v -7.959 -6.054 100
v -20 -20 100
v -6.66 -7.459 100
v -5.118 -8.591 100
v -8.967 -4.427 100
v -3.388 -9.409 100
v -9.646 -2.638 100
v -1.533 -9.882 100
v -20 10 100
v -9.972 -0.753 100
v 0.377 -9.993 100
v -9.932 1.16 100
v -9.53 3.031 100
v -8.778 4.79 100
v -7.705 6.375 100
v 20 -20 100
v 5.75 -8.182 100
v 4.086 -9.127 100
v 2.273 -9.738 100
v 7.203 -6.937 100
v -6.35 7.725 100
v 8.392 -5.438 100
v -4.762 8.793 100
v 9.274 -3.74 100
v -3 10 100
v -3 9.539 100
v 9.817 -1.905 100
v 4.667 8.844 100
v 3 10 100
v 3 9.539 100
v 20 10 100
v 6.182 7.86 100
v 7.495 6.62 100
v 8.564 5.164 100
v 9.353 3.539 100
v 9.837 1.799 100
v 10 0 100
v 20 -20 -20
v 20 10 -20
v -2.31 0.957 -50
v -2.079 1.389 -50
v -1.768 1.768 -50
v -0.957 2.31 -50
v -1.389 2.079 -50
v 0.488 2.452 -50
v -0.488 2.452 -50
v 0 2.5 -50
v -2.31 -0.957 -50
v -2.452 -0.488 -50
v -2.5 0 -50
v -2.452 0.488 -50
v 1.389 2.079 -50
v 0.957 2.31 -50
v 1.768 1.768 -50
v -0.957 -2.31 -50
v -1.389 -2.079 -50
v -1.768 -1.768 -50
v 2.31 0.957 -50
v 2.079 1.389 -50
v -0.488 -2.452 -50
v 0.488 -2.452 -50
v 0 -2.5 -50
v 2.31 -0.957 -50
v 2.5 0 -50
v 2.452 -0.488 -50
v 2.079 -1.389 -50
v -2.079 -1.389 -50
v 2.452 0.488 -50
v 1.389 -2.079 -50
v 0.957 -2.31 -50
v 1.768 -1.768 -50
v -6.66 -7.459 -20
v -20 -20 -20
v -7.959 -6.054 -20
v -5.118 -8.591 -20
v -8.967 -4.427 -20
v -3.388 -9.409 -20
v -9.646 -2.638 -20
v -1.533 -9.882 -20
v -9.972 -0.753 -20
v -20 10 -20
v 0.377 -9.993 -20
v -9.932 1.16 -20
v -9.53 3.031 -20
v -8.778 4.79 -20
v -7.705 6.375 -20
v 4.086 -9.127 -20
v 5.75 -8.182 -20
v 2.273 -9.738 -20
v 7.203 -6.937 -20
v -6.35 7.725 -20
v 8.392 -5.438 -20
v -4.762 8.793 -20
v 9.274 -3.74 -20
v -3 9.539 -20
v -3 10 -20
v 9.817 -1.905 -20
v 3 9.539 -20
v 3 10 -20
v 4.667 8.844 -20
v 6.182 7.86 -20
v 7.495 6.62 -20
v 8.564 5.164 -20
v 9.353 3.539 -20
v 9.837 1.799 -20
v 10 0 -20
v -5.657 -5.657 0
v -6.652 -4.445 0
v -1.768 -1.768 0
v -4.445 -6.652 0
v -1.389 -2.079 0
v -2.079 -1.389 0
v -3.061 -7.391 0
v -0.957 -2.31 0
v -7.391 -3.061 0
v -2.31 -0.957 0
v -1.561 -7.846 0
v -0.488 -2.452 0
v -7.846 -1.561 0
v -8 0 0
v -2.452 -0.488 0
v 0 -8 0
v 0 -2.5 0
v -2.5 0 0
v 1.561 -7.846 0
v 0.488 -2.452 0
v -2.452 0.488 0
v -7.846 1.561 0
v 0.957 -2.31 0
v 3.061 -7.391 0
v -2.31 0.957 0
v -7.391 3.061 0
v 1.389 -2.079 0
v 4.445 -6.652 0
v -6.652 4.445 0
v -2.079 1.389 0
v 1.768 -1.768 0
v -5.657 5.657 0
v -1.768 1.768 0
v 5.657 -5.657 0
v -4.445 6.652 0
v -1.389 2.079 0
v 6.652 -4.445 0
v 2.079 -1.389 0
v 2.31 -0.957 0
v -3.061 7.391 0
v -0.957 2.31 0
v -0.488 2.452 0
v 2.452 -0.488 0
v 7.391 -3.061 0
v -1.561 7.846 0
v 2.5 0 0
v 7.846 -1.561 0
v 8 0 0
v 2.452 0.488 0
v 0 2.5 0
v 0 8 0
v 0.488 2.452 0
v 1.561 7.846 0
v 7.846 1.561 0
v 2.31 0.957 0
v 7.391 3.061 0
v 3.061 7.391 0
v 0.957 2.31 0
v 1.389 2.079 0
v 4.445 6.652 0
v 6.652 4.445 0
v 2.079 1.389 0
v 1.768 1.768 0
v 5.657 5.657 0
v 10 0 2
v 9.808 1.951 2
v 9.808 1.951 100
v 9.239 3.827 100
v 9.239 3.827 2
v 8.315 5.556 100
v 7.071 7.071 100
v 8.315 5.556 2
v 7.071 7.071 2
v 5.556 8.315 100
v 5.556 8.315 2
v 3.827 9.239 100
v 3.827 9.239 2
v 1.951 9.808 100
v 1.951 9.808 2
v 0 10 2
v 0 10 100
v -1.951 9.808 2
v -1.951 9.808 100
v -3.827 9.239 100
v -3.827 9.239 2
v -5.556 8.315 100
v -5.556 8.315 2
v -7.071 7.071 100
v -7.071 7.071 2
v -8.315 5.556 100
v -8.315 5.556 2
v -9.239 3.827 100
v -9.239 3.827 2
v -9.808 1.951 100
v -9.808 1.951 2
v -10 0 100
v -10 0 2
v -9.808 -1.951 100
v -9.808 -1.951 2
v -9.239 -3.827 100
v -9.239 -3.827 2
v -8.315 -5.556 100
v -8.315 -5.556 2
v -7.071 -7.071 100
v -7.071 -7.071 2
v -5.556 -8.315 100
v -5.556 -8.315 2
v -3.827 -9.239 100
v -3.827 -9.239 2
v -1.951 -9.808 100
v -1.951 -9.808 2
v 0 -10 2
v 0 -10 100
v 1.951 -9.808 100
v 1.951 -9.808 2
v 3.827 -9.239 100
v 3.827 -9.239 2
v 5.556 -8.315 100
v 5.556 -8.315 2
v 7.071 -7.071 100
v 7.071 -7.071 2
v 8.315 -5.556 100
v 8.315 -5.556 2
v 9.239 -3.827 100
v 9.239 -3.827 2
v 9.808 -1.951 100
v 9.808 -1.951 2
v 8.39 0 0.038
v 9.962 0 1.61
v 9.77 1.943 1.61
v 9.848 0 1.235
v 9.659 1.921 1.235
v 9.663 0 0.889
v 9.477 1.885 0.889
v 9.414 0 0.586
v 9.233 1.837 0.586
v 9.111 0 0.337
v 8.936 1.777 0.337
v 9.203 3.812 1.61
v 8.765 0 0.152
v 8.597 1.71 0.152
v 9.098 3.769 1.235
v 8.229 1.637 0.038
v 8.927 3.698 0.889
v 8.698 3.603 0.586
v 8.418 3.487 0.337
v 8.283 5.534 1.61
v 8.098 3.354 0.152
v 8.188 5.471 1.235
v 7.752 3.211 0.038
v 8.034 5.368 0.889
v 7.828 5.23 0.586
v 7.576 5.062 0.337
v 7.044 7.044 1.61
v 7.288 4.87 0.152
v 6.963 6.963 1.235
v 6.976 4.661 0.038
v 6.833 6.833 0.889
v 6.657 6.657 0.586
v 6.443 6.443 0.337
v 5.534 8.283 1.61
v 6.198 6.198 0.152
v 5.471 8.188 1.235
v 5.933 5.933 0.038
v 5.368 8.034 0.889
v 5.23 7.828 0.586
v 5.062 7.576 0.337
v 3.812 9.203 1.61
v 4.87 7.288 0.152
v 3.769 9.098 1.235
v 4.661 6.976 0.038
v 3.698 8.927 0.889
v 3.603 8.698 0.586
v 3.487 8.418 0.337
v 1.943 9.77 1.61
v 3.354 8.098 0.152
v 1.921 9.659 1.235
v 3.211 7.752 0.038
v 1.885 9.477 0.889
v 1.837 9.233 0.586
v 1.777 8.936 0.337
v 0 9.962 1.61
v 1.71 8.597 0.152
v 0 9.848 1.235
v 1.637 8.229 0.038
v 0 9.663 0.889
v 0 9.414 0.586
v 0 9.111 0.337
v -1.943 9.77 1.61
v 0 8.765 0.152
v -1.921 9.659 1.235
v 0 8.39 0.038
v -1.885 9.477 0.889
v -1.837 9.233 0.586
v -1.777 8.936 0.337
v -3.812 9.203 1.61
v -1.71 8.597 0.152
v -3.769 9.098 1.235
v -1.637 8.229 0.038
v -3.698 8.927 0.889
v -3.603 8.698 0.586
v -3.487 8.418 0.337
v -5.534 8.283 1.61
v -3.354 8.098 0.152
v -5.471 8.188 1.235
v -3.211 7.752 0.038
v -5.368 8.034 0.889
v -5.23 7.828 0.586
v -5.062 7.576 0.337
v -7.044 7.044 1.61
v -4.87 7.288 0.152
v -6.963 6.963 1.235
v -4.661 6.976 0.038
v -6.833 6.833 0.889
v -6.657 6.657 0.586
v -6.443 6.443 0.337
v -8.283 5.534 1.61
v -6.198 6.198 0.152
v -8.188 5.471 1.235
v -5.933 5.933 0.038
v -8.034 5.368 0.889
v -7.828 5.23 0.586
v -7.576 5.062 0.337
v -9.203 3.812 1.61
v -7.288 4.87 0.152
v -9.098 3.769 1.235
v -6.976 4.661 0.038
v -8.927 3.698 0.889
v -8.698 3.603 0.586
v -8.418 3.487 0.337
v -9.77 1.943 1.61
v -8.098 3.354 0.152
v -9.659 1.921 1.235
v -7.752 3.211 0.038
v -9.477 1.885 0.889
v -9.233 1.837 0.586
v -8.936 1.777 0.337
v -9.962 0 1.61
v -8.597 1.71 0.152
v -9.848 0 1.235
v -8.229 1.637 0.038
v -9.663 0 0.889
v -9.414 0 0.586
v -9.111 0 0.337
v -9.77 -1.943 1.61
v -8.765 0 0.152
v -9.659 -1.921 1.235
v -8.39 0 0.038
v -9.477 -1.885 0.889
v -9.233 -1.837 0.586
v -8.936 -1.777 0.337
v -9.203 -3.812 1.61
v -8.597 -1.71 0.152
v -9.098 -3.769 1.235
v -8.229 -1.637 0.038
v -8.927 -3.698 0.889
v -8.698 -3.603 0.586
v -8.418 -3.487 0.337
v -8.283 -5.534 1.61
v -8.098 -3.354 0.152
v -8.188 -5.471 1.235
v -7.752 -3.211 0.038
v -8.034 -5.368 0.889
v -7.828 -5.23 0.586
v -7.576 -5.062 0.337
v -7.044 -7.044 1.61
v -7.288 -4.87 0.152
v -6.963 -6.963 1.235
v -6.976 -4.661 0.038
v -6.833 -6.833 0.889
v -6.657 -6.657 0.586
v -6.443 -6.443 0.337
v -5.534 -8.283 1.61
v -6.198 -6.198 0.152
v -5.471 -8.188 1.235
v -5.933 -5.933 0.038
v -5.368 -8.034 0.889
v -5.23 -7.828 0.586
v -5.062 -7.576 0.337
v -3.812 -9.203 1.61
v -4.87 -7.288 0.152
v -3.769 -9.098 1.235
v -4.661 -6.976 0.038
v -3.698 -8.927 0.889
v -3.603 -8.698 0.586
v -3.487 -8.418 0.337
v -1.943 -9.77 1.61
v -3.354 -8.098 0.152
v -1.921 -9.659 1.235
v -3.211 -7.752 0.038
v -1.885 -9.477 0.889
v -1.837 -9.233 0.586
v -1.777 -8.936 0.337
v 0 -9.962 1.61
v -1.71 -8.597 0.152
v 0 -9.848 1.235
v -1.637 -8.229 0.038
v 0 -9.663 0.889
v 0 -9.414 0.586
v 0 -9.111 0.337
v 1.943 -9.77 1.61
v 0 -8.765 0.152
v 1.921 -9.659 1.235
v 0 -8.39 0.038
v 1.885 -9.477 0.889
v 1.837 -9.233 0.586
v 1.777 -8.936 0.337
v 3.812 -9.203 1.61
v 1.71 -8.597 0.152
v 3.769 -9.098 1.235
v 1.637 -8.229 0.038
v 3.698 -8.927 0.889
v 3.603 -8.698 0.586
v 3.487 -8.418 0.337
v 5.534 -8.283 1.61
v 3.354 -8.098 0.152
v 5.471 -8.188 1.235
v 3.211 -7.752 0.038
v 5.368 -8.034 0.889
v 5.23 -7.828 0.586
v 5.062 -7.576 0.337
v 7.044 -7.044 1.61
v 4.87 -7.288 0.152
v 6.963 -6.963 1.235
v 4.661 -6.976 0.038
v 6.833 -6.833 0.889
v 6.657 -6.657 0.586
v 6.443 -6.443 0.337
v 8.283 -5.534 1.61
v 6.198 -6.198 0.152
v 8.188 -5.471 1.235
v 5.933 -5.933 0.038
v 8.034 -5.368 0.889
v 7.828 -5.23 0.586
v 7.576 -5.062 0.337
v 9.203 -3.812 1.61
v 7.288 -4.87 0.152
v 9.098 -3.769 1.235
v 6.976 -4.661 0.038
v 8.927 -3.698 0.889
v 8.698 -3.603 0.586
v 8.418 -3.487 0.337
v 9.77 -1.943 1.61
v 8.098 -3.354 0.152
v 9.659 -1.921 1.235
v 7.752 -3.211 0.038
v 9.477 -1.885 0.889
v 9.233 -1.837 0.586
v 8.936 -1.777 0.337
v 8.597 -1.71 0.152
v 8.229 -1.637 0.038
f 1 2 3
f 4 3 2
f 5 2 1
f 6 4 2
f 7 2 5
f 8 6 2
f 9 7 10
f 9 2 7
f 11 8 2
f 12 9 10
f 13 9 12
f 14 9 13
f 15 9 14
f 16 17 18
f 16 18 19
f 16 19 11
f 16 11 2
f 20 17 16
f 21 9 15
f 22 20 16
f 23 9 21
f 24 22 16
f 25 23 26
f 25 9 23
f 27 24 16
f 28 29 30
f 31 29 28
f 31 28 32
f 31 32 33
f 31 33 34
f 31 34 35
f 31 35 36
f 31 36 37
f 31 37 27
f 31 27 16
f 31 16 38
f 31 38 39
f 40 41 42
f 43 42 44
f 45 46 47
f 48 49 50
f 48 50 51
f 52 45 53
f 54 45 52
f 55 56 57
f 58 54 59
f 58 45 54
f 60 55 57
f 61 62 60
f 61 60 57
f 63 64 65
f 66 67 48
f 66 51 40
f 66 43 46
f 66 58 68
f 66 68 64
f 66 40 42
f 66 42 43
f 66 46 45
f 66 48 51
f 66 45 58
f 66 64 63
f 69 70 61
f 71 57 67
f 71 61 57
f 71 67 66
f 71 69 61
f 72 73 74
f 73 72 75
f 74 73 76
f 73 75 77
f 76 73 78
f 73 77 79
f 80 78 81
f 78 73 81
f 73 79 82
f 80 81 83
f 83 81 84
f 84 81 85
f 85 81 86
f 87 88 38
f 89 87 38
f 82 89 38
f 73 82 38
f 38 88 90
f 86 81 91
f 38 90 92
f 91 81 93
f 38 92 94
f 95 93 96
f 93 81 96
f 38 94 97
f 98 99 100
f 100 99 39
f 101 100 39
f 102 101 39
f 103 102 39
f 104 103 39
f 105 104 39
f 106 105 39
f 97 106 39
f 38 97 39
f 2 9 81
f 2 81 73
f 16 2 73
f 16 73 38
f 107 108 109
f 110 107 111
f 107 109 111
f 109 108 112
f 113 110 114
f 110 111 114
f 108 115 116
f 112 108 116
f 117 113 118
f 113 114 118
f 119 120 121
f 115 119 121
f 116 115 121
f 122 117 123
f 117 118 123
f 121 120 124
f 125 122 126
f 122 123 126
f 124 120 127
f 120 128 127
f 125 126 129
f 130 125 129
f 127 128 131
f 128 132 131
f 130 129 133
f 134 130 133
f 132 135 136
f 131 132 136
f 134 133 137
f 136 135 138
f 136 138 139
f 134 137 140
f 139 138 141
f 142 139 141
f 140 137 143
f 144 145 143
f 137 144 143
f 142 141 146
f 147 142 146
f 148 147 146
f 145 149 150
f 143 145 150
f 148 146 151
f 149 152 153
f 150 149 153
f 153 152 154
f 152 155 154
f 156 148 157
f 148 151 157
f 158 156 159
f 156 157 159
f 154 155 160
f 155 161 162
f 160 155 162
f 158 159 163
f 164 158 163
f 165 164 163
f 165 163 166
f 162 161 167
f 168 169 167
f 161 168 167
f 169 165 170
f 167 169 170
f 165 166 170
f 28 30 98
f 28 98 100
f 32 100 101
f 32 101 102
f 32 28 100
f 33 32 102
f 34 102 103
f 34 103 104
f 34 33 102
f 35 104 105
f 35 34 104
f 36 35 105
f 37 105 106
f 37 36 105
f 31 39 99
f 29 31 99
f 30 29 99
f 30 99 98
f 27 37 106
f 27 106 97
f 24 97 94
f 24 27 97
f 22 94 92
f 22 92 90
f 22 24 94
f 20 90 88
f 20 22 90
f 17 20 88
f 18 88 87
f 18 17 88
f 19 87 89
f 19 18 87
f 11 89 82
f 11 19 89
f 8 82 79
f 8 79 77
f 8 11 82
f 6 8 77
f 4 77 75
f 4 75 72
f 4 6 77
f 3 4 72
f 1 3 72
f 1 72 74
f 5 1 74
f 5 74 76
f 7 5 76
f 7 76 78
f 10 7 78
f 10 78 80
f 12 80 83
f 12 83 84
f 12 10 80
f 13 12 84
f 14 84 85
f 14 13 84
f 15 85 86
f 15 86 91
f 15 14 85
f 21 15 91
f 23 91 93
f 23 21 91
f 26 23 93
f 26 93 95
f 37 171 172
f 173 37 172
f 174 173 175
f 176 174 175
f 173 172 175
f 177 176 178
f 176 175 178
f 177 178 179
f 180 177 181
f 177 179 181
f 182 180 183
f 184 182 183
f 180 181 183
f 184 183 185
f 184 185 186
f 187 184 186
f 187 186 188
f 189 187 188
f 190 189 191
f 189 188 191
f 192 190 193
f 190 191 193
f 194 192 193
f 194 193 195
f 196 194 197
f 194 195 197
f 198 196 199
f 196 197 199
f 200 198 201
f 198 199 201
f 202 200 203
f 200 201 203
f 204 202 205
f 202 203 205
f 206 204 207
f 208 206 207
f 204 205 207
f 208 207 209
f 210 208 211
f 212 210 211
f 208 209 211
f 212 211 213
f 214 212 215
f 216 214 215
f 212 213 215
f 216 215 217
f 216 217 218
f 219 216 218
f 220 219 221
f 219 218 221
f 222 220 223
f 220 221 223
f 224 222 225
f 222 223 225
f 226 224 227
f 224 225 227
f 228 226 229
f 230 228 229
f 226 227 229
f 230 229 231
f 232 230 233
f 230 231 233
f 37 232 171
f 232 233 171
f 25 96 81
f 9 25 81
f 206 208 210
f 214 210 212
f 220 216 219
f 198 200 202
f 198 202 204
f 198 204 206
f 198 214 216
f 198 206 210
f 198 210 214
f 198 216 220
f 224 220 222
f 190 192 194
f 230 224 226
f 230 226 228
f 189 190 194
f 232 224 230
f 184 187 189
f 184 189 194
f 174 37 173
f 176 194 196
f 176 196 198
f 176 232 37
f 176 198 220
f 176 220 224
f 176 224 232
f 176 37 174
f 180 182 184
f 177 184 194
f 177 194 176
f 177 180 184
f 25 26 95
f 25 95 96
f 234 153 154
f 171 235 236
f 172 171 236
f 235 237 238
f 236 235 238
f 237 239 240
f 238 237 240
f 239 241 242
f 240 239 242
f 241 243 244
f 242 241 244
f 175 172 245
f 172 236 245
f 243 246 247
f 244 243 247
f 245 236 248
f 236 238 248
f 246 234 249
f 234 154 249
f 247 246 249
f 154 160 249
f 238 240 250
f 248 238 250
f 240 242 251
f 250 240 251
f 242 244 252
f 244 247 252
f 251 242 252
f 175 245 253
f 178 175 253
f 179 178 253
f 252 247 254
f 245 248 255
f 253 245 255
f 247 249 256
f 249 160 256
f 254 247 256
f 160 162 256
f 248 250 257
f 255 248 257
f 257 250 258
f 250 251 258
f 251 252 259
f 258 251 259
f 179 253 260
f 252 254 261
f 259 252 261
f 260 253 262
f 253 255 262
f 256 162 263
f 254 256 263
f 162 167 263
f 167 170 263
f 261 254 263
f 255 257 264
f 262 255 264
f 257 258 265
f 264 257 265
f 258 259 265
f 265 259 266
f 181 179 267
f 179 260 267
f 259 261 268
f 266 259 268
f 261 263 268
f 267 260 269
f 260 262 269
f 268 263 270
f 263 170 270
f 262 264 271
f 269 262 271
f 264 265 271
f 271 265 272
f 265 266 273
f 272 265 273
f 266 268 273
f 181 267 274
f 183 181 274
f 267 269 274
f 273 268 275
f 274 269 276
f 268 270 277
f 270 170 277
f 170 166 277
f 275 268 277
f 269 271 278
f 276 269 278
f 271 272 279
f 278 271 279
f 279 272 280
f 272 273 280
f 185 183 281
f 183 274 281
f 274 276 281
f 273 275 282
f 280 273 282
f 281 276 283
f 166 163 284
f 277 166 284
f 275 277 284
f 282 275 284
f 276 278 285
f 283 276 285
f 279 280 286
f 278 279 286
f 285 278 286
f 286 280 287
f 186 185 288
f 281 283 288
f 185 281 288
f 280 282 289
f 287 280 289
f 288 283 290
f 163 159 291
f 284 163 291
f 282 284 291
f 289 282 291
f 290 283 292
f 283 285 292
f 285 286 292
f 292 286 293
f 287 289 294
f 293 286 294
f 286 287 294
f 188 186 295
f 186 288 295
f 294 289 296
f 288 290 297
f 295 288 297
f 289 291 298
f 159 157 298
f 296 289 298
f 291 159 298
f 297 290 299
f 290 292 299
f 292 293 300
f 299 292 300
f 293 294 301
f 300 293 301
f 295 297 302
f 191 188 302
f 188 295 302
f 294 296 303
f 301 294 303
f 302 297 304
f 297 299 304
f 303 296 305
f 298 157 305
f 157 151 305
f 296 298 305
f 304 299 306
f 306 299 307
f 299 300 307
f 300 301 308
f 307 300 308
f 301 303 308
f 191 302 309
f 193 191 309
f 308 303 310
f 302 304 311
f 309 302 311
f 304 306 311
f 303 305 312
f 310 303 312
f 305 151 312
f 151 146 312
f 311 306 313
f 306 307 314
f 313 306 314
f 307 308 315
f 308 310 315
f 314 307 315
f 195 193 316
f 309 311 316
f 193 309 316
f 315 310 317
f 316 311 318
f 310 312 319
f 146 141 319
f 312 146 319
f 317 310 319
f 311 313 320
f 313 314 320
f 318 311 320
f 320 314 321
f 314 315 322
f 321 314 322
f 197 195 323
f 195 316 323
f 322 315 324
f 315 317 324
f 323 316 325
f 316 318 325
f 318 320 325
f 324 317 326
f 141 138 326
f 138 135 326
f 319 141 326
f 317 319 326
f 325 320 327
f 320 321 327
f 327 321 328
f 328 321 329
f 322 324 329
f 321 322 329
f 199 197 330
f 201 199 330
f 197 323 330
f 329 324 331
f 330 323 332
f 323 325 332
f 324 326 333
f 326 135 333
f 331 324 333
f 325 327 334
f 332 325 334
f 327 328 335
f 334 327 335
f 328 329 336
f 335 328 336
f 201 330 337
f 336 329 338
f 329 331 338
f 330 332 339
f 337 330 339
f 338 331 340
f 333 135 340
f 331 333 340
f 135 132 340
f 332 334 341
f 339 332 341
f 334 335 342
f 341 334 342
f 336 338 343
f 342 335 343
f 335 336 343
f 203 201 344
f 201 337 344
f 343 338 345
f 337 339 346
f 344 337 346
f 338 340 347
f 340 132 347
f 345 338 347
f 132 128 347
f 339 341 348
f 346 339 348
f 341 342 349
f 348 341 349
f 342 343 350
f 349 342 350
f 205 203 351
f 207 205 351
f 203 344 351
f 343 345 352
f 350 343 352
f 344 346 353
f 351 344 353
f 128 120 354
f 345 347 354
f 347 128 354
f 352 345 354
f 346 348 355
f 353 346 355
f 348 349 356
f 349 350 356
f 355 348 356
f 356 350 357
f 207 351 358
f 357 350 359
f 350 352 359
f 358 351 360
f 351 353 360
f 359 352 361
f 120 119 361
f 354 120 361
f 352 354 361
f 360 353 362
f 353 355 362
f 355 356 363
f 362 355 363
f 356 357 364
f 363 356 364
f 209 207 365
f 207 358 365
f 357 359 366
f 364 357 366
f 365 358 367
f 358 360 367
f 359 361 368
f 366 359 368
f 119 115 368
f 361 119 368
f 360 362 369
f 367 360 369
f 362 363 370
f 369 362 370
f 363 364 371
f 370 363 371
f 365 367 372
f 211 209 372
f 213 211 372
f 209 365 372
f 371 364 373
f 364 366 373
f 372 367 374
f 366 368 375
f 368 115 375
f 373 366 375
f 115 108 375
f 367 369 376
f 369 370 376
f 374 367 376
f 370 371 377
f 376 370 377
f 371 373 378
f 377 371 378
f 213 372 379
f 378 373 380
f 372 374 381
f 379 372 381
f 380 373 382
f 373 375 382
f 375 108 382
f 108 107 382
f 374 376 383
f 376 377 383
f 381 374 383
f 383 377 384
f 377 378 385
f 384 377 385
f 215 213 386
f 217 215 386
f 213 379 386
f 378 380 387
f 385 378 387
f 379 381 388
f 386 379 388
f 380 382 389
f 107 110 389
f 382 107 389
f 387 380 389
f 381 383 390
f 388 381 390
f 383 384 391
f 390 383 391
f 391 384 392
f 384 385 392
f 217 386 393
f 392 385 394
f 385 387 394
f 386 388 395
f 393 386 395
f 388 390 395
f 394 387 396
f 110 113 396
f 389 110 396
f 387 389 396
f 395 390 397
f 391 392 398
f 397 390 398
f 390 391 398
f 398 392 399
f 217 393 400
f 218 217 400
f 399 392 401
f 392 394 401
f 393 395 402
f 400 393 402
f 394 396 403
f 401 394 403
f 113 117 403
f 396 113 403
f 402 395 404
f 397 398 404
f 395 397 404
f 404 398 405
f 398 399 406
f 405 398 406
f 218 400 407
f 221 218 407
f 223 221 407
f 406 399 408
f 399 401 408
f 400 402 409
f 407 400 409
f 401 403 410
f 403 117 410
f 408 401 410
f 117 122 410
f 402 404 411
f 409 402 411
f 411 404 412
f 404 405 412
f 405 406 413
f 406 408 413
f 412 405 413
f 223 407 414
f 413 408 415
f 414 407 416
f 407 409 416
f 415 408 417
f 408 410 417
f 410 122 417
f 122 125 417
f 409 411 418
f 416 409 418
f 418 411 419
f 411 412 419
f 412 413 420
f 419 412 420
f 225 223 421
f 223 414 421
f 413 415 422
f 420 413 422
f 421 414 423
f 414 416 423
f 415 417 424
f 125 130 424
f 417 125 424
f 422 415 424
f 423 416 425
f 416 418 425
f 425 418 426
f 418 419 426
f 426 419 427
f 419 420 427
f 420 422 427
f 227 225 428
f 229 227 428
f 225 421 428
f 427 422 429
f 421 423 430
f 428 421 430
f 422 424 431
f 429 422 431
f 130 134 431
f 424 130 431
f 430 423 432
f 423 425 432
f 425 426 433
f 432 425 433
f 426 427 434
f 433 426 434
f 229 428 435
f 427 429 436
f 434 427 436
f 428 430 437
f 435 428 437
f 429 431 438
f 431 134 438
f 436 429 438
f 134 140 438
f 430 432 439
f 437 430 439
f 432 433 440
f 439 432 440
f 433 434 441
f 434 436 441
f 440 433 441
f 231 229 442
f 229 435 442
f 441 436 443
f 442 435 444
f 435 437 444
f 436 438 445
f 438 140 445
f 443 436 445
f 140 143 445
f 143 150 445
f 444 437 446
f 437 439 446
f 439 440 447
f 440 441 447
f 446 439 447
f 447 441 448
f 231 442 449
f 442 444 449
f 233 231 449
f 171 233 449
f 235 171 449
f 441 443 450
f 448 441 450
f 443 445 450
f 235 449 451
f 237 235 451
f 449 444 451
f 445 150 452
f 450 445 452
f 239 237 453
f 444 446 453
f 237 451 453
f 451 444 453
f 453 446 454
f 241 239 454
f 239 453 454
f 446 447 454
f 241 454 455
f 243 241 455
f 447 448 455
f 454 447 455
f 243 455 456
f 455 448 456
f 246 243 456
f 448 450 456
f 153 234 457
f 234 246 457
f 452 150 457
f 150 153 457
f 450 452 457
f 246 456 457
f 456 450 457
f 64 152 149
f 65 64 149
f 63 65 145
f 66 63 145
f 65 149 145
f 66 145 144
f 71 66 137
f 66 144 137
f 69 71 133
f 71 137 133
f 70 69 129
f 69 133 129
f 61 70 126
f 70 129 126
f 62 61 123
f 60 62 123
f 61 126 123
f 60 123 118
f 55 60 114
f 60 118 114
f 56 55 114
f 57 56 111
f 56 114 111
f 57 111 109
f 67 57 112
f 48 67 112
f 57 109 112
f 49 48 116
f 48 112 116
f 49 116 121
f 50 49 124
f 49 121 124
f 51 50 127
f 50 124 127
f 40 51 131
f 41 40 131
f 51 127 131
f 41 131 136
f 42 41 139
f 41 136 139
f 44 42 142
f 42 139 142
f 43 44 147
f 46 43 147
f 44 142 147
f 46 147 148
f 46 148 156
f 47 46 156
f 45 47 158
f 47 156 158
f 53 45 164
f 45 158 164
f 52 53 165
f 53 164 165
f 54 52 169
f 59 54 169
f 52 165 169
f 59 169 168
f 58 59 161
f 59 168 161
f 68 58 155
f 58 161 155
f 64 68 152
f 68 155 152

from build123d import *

# Parameters (mm, degrees)
F0_R     = 10
F1_DEPTH = 100
F2_R     = 2.5
F3_DEPTH = 50
F4_R     = 2
F6_DEPTH = 120


with BuildPart() as f1:
    # F0 (on Top) → F1 (new body)
    with BuildSketch(Plane.XY):
        Circle(F0_R)
    extrude(amount=F1_DEPTH)

    # F2 (on face) → F3 (join)
    with BuildSketch(Plane(origin=(0, 0, 0), x_dir=(1, 0, 0), z_dir=(0, 0, -1))):
        Circle(F2_R)
    extrude(amount=F3_DEPTH)

    # F4
    f4_edges = [f1.edges().sort_by_distance(p)[0] for p in [
        (-10, 0, 0),
    ]]
    fillet(f4_edges, radius=F4_R)


with BuildPart() as f6:
    # F5 (on face) → F6 (new body)
    with BuildSketch(Plane.XY.offset(100)):
        with BuildLine():
            Line((-20, -20), (20, -20))
            Line((20, -20), (20, 10))
            Line((20, 10), (3, 10))
            Line((3, 10), (3, 9.539392))
            ThreePointArc((3, 9.539392), (8.062258, 5.91608), (10, 0))
            ThreePointArc((10, 0), (-5.91608, -8.062258), (-3, 9.539392))
            Line((-3, 9.539392), (-3, 10))
            Line((-3, 10), (-20, 10))
            Line((-20, 10), (-20, -20))
        make_face()
    extrude(amount=-F6_DEPTH)


solid = Compound([f1.part, f6.part])
